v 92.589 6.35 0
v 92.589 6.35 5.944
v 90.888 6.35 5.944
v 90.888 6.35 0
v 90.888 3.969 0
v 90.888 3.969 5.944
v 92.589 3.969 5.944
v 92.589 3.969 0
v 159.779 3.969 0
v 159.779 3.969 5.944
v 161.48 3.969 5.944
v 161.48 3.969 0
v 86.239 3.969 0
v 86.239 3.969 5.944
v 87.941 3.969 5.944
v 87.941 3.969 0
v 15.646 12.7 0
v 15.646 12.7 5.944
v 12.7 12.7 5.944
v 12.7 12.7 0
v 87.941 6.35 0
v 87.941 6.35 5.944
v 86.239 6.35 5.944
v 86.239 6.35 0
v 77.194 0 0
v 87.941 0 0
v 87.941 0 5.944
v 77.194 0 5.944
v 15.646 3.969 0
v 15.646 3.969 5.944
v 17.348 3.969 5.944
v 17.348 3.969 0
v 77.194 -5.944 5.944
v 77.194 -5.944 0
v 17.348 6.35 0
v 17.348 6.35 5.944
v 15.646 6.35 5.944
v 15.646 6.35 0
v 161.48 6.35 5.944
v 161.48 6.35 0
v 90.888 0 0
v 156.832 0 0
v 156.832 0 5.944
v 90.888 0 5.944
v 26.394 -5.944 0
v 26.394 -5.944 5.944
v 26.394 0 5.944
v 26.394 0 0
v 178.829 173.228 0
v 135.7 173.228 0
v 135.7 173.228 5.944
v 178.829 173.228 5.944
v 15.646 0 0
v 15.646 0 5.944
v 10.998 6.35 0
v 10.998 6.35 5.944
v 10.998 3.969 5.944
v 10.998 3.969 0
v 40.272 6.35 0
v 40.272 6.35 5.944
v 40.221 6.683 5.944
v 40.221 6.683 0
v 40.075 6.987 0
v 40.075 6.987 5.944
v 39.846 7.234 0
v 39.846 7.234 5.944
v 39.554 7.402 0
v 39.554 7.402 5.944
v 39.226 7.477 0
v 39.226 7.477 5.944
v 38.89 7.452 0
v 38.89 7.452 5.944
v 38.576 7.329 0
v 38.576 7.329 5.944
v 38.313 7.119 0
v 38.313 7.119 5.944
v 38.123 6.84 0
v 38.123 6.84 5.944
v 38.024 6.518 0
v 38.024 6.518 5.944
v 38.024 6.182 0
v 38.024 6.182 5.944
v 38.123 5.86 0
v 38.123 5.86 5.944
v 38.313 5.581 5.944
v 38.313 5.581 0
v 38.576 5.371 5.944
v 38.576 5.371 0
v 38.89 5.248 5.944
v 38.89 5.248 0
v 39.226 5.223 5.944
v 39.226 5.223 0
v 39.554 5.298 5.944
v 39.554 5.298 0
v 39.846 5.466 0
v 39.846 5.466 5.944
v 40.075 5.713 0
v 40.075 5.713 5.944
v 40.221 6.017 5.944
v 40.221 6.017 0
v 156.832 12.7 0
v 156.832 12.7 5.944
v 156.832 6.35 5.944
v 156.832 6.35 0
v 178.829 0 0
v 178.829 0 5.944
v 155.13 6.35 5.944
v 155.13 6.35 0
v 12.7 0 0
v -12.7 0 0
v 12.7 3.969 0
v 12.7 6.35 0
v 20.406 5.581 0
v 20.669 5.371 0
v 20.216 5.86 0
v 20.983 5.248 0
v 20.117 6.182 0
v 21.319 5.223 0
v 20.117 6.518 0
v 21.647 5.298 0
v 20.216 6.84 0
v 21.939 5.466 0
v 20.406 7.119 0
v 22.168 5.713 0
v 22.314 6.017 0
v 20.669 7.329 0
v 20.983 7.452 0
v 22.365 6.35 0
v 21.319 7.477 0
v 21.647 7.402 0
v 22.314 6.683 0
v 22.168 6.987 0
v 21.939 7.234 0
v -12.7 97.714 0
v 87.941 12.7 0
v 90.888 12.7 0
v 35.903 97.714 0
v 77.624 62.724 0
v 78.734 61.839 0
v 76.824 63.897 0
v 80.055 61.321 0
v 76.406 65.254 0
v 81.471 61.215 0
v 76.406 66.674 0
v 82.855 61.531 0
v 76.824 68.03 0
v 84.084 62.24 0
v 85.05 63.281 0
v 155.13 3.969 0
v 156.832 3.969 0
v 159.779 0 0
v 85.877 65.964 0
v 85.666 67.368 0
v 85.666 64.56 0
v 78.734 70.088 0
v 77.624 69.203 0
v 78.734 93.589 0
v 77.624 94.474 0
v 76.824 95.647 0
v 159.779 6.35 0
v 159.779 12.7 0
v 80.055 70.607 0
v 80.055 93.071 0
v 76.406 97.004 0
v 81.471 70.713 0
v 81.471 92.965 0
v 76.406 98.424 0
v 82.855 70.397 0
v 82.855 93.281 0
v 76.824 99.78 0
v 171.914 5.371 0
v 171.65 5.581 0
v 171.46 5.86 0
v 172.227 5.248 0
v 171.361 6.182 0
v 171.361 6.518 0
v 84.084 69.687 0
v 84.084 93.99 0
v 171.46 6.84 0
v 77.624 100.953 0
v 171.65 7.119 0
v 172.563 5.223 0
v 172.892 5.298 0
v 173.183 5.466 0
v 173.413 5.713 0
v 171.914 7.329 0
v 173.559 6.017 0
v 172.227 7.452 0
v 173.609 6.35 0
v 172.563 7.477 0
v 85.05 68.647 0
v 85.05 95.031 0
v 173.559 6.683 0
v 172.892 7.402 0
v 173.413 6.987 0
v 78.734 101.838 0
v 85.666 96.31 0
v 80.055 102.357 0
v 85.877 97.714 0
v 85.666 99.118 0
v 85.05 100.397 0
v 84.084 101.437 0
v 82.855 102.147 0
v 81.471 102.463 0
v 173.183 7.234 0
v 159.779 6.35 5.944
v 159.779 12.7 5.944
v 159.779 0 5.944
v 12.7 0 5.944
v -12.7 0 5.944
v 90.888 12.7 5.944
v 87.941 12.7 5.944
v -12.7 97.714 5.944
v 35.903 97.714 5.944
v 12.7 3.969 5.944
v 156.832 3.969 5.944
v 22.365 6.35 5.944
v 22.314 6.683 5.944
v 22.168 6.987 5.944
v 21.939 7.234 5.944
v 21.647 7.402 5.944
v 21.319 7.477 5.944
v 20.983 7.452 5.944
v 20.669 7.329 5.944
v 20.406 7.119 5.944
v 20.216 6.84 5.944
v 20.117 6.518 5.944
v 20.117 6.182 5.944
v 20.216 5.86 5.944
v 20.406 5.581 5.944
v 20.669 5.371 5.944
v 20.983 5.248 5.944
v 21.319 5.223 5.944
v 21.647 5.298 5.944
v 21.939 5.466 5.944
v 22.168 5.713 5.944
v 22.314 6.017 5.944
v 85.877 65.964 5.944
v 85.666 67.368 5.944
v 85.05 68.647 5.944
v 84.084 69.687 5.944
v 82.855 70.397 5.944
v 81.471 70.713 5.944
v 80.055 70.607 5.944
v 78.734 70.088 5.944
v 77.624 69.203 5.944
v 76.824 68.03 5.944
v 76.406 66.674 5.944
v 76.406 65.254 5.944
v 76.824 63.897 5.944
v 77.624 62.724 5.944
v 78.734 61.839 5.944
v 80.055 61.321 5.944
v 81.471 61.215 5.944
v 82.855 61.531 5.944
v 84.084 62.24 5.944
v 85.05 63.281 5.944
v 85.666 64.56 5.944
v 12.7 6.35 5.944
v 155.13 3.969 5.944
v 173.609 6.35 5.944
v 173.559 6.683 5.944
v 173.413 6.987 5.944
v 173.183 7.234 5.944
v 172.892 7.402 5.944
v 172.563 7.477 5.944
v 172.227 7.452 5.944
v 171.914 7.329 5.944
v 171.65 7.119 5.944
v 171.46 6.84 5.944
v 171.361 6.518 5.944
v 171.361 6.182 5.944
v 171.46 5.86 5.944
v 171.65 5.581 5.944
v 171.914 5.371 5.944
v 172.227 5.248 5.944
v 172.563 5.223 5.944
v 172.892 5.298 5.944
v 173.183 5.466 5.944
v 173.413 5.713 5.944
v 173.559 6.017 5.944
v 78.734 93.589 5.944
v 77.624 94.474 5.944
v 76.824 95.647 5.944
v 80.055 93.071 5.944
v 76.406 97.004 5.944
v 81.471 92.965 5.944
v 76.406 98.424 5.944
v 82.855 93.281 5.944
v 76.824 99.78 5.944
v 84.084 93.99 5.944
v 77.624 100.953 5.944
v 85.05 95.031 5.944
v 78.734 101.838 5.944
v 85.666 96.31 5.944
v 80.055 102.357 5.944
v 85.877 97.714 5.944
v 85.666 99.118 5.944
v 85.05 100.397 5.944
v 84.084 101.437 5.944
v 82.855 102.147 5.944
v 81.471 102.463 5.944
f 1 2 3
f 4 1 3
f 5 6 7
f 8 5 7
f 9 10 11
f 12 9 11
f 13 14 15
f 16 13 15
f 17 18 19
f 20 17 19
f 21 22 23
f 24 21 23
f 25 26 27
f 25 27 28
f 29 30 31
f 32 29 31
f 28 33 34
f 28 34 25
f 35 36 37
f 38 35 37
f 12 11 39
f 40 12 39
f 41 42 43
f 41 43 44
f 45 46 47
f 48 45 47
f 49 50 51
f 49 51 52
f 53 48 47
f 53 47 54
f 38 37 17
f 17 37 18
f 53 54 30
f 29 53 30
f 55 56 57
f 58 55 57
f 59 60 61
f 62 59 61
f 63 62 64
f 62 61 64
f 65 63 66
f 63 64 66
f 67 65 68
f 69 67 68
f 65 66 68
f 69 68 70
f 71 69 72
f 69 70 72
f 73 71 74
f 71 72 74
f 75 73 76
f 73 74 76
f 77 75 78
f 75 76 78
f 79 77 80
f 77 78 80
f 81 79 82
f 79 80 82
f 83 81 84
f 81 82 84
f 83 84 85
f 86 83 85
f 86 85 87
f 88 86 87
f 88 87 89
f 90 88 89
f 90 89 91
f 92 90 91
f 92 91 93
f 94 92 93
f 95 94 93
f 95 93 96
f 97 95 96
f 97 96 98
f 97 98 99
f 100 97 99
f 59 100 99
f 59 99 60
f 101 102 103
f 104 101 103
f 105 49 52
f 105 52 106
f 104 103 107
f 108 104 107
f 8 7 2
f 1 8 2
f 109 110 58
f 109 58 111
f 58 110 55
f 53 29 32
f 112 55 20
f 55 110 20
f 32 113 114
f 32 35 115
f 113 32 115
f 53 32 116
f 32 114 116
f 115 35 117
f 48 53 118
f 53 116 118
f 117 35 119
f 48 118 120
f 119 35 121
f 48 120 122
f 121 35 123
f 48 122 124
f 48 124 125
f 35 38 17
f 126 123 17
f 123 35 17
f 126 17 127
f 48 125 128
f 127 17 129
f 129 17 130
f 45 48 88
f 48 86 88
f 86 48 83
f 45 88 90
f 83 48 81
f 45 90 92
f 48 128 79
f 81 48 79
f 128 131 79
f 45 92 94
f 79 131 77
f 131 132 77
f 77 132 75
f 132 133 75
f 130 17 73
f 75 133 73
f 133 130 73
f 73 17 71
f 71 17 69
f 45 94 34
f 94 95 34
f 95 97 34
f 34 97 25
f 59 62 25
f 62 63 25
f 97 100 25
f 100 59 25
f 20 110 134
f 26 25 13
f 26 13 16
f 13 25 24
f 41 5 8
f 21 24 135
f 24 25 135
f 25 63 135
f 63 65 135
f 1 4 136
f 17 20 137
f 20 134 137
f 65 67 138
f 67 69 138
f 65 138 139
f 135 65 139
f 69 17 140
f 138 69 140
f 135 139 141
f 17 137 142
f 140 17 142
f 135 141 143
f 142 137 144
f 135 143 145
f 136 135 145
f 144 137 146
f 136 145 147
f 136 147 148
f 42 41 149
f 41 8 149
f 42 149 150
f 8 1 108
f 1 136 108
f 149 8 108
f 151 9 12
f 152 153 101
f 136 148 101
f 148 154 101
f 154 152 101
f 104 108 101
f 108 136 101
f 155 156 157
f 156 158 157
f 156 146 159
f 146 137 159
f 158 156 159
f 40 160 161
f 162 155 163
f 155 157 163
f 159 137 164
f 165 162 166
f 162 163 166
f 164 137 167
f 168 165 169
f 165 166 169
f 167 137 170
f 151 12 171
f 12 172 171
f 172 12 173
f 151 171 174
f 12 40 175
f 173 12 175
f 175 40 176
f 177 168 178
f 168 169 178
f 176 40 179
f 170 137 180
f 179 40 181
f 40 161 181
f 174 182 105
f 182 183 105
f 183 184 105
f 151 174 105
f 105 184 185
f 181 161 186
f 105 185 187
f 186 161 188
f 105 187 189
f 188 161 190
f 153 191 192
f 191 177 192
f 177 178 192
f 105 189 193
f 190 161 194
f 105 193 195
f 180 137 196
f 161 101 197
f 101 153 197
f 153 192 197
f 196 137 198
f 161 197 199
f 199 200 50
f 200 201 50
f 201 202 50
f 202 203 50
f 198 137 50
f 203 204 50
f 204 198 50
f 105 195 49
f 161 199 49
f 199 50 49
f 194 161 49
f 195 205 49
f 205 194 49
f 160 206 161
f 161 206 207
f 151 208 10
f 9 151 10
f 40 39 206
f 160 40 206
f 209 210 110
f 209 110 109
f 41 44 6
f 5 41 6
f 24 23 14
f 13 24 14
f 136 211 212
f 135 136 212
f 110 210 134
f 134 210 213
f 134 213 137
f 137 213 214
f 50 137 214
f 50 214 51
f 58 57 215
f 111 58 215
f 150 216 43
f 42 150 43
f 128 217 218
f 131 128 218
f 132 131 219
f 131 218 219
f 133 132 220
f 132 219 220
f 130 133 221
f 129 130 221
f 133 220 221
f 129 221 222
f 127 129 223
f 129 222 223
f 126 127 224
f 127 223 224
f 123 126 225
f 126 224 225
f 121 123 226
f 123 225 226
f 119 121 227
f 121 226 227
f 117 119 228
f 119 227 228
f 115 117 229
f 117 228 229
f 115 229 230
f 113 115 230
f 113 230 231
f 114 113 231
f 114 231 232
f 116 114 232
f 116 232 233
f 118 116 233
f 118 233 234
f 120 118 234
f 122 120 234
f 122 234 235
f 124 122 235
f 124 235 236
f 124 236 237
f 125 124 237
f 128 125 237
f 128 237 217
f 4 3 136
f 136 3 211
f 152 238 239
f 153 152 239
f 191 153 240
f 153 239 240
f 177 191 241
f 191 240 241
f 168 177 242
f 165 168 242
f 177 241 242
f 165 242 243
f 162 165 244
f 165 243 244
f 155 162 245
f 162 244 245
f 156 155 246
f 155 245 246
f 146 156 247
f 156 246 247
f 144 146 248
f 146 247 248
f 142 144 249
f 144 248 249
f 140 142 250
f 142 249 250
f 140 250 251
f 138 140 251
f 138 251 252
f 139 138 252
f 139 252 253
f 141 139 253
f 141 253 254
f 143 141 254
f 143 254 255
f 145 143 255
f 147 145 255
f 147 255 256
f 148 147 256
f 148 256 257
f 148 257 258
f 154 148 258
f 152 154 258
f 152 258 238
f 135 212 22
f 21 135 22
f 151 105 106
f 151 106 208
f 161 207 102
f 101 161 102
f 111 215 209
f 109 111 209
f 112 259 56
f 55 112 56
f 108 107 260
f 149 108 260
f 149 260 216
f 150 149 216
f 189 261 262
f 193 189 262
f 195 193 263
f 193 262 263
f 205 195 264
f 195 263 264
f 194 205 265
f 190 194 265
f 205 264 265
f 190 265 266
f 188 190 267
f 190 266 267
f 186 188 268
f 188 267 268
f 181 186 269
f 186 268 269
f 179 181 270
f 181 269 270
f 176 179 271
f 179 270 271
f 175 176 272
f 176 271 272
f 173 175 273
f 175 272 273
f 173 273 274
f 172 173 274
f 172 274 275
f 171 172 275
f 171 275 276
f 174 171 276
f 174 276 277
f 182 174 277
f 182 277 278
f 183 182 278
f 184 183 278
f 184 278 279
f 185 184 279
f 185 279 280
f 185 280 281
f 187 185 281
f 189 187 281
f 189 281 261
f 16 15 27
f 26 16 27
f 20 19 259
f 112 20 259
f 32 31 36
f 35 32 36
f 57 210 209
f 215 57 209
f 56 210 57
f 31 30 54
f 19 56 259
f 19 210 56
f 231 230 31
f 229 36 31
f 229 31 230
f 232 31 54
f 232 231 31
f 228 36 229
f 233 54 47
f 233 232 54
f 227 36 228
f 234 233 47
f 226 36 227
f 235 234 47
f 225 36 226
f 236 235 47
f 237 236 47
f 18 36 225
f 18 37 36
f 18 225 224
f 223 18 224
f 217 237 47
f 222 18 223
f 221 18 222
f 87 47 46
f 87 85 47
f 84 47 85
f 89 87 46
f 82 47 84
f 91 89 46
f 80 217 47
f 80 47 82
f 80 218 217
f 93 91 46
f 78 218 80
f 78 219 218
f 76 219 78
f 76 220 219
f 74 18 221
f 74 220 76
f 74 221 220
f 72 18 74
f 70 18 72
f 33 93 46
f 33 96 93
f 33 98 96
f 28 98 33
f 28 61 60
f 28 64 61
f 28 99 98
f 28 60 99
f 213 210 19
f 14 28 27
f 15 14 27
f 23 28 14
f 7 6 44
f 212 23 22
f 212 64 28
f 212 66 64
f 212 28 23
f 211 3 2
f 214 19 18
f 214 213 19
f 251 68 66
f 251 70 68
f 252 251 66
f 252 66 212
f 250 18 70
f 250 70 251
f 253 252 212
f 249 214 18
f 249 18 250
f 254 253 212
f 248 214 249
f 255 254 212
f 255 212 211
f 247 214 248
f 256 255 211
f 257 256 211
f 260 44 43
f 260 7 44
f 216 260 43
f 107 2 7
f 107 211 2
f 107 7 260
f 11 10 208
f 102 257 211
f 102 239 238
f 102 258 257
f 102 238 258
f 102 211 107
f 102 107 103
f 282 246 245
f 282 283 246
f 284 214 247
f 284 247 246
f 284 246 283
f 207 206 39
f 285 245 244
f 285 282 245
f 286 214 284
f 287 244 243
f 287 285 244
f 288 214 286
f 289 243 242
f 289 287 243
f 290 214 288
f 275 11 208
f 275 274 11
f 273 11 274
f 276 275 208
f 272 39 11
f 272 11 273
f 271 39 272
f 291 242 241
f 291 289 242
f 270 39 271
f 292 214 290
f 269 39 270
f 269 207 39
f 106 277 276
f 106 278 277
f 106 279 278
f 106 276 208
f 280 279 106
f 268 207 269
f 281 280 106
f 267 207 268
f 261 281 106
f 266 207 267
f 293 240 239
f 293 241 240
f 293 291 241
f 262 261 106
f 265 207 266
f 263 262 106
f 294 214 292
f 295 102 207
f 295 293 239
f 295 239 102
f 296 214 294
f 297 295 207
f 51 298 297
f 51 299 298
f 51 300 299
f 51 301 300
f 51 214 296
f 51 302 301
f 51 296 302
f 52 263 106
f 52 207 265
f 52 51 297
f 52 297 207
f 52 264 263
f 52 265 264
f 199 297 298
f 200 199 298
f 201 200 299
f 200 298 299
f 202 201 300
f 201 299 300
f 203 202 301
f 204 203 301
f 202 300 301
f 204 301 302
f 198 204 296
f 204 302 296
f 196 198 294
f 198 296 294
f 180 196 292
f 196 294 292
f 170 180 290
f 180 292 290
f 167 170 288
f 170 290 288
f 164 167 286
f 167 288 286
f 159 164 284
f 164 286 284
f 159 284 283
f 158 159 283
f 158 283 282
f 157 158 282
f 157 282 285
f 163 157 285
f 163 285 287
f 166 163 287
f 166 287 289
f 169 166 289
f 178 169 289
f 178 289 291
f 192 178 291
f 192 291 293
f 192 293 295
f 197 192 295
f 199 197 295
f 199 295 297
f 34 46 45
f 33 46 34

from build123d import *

# Parameters (mm, degrees)
BOSS_EXTRUDE1_DEPTH = 5.9436
SKETCH3_R           = 4.7625
CUT_EXTRUDE1_DEPTH  = 6.9436
CUT_EXTRUDE2_DEPTH  = 6.9436
SKETCH5_W           = 50.8
SKETCH5_H           = 5.9436
BOSS_EXTRUDE2_DEPTH = 5.9436
SKETCH6_R           = 4.7625
CUT_EXTRUDE3_DEPTH  = 6.9436
SKETCH7_W           = 12.7
SKETCH7_H           = 97.7138
BOSS_EXTRUDE3_DEPTH = 5.9436
SKETCH8_R           = 1.1303
CUT_EXTRUDE4_DEPTH  = 6.9436


with BuildPart() as part:
    # Sketch1 → Boss-Extrude1 (new body)
    with BuildSketch(Plane.XY):
        Polygon((0, 0), (0, 97.7138), (35.9029, 97.7138), (135.6995, 173.228), (178.8287, 173.228), (178.8287, 0), align=None)
    extrude(amount=BOSS_EXTRUDE1_DEPTH)

    # Sketch3 → Cut-Extrude1 (cut, through all)
    with BuildSketch(Plane.XY.offset(5.9436)):
        with Locations((81.1149, 97.7138)):
            Circle(SKETCH3_R)
    extrude(amount=-CUT_EXTRUDE1_DEPTH, mode=Mode.SUBTRACT)

    # Sketch4 → Cut-Extrude2 (cut, through all)
    with BuildSketch(Plane.XY.offset(5.9436)):
        Polygon((12.7, 3.96875), (12.7, 0), (15.6464, 0), (15.6464, 3.96875), (17.3482, 3.96875), (17.3482, 6.35), (15.6464, 6.35), (15.6464, 12.7), (12.7, 12.7), (12.7, 6.35), (10.9982, 6.35), (10.9982, 3.96875), align=None)
        Polygon((87.94115, 3.96875), (87.94115, 0), (90.88755, 0), (90.88755, 3.96875), (92.58935, 3.96875), (92.58935, 6.35), (90.88755, 6.35), (90.88755, 12.7), (87.94115, 12.7), (87.94115, 6.35), (86.23935, 6.35), (86.23935, 3.96875), align=None)
        Polygon((156.8323, 3.96875), (156.8323, 0), (159.7787, 0), (159.7787, 3.96875), (161.4805, 3.96875), (161.4805, 6.35), (159.7787, 6.35), (159.7787, 12.7), (156.8323, 12.7), (156.8323, 6.35), (155.1305, 6.35), (155.1305, 3.96875), align=None)
    extrude(amount=-CUT_EXTRUDE2_DEPTH, mode=Mode.SUBTRACT)

    # Sketch5 → Boss-Extrude2 (add)
    with BuildSketch(Plane.XY.offset(5.9436)):
        with Locations((51.793775, -2.9718)):
            Rectangle(SKETCH5_W, SKETCH5_H)
    extrude(amount=-BOSS_EXTRUDE2_DEPTH)

    # Sketch6 → Cut-Extrude3 (cut, through all)
    with BuildSketch(Plane.XY.offset(5.9436)):
        with Locations((81.1149, 65.9638)):
            Circle(SKETCH6_R)
    extrude(amount=-CUT_EXTRUDE3_DEPTH, mode=Mode.SUBTRACT)

    # Sketch7 → Boss-Extrude3 (add)
    with BuildSketch(Plane.XY.offset(5.9436)):
        with Locations((-6.35, 48.8569)):
            Rectangle(SKETCH7_W, SKETCH7_H)
    extrude(amount=-BOSS_EXTRUDE3_DEPTH)

    # Sketch8 → Cut-Extrude4 (cut, through all)
    with BuildSketch(Plane.XY.offset(5.9436)):
        with Locations((39.1414, 6.35)):
            Circle(SKETCH8_R)
        with Locations((172.4787, 6.35)):
            Circle(SKETCH8_R)
        with Locations((21.2344, 6.35)):
            Circle(SKETCH8_R)
    extrude(amount=-CUT_EXTRUDE4_DEPTH, mode=Mode.SUBTRACT)


solid = part.part
